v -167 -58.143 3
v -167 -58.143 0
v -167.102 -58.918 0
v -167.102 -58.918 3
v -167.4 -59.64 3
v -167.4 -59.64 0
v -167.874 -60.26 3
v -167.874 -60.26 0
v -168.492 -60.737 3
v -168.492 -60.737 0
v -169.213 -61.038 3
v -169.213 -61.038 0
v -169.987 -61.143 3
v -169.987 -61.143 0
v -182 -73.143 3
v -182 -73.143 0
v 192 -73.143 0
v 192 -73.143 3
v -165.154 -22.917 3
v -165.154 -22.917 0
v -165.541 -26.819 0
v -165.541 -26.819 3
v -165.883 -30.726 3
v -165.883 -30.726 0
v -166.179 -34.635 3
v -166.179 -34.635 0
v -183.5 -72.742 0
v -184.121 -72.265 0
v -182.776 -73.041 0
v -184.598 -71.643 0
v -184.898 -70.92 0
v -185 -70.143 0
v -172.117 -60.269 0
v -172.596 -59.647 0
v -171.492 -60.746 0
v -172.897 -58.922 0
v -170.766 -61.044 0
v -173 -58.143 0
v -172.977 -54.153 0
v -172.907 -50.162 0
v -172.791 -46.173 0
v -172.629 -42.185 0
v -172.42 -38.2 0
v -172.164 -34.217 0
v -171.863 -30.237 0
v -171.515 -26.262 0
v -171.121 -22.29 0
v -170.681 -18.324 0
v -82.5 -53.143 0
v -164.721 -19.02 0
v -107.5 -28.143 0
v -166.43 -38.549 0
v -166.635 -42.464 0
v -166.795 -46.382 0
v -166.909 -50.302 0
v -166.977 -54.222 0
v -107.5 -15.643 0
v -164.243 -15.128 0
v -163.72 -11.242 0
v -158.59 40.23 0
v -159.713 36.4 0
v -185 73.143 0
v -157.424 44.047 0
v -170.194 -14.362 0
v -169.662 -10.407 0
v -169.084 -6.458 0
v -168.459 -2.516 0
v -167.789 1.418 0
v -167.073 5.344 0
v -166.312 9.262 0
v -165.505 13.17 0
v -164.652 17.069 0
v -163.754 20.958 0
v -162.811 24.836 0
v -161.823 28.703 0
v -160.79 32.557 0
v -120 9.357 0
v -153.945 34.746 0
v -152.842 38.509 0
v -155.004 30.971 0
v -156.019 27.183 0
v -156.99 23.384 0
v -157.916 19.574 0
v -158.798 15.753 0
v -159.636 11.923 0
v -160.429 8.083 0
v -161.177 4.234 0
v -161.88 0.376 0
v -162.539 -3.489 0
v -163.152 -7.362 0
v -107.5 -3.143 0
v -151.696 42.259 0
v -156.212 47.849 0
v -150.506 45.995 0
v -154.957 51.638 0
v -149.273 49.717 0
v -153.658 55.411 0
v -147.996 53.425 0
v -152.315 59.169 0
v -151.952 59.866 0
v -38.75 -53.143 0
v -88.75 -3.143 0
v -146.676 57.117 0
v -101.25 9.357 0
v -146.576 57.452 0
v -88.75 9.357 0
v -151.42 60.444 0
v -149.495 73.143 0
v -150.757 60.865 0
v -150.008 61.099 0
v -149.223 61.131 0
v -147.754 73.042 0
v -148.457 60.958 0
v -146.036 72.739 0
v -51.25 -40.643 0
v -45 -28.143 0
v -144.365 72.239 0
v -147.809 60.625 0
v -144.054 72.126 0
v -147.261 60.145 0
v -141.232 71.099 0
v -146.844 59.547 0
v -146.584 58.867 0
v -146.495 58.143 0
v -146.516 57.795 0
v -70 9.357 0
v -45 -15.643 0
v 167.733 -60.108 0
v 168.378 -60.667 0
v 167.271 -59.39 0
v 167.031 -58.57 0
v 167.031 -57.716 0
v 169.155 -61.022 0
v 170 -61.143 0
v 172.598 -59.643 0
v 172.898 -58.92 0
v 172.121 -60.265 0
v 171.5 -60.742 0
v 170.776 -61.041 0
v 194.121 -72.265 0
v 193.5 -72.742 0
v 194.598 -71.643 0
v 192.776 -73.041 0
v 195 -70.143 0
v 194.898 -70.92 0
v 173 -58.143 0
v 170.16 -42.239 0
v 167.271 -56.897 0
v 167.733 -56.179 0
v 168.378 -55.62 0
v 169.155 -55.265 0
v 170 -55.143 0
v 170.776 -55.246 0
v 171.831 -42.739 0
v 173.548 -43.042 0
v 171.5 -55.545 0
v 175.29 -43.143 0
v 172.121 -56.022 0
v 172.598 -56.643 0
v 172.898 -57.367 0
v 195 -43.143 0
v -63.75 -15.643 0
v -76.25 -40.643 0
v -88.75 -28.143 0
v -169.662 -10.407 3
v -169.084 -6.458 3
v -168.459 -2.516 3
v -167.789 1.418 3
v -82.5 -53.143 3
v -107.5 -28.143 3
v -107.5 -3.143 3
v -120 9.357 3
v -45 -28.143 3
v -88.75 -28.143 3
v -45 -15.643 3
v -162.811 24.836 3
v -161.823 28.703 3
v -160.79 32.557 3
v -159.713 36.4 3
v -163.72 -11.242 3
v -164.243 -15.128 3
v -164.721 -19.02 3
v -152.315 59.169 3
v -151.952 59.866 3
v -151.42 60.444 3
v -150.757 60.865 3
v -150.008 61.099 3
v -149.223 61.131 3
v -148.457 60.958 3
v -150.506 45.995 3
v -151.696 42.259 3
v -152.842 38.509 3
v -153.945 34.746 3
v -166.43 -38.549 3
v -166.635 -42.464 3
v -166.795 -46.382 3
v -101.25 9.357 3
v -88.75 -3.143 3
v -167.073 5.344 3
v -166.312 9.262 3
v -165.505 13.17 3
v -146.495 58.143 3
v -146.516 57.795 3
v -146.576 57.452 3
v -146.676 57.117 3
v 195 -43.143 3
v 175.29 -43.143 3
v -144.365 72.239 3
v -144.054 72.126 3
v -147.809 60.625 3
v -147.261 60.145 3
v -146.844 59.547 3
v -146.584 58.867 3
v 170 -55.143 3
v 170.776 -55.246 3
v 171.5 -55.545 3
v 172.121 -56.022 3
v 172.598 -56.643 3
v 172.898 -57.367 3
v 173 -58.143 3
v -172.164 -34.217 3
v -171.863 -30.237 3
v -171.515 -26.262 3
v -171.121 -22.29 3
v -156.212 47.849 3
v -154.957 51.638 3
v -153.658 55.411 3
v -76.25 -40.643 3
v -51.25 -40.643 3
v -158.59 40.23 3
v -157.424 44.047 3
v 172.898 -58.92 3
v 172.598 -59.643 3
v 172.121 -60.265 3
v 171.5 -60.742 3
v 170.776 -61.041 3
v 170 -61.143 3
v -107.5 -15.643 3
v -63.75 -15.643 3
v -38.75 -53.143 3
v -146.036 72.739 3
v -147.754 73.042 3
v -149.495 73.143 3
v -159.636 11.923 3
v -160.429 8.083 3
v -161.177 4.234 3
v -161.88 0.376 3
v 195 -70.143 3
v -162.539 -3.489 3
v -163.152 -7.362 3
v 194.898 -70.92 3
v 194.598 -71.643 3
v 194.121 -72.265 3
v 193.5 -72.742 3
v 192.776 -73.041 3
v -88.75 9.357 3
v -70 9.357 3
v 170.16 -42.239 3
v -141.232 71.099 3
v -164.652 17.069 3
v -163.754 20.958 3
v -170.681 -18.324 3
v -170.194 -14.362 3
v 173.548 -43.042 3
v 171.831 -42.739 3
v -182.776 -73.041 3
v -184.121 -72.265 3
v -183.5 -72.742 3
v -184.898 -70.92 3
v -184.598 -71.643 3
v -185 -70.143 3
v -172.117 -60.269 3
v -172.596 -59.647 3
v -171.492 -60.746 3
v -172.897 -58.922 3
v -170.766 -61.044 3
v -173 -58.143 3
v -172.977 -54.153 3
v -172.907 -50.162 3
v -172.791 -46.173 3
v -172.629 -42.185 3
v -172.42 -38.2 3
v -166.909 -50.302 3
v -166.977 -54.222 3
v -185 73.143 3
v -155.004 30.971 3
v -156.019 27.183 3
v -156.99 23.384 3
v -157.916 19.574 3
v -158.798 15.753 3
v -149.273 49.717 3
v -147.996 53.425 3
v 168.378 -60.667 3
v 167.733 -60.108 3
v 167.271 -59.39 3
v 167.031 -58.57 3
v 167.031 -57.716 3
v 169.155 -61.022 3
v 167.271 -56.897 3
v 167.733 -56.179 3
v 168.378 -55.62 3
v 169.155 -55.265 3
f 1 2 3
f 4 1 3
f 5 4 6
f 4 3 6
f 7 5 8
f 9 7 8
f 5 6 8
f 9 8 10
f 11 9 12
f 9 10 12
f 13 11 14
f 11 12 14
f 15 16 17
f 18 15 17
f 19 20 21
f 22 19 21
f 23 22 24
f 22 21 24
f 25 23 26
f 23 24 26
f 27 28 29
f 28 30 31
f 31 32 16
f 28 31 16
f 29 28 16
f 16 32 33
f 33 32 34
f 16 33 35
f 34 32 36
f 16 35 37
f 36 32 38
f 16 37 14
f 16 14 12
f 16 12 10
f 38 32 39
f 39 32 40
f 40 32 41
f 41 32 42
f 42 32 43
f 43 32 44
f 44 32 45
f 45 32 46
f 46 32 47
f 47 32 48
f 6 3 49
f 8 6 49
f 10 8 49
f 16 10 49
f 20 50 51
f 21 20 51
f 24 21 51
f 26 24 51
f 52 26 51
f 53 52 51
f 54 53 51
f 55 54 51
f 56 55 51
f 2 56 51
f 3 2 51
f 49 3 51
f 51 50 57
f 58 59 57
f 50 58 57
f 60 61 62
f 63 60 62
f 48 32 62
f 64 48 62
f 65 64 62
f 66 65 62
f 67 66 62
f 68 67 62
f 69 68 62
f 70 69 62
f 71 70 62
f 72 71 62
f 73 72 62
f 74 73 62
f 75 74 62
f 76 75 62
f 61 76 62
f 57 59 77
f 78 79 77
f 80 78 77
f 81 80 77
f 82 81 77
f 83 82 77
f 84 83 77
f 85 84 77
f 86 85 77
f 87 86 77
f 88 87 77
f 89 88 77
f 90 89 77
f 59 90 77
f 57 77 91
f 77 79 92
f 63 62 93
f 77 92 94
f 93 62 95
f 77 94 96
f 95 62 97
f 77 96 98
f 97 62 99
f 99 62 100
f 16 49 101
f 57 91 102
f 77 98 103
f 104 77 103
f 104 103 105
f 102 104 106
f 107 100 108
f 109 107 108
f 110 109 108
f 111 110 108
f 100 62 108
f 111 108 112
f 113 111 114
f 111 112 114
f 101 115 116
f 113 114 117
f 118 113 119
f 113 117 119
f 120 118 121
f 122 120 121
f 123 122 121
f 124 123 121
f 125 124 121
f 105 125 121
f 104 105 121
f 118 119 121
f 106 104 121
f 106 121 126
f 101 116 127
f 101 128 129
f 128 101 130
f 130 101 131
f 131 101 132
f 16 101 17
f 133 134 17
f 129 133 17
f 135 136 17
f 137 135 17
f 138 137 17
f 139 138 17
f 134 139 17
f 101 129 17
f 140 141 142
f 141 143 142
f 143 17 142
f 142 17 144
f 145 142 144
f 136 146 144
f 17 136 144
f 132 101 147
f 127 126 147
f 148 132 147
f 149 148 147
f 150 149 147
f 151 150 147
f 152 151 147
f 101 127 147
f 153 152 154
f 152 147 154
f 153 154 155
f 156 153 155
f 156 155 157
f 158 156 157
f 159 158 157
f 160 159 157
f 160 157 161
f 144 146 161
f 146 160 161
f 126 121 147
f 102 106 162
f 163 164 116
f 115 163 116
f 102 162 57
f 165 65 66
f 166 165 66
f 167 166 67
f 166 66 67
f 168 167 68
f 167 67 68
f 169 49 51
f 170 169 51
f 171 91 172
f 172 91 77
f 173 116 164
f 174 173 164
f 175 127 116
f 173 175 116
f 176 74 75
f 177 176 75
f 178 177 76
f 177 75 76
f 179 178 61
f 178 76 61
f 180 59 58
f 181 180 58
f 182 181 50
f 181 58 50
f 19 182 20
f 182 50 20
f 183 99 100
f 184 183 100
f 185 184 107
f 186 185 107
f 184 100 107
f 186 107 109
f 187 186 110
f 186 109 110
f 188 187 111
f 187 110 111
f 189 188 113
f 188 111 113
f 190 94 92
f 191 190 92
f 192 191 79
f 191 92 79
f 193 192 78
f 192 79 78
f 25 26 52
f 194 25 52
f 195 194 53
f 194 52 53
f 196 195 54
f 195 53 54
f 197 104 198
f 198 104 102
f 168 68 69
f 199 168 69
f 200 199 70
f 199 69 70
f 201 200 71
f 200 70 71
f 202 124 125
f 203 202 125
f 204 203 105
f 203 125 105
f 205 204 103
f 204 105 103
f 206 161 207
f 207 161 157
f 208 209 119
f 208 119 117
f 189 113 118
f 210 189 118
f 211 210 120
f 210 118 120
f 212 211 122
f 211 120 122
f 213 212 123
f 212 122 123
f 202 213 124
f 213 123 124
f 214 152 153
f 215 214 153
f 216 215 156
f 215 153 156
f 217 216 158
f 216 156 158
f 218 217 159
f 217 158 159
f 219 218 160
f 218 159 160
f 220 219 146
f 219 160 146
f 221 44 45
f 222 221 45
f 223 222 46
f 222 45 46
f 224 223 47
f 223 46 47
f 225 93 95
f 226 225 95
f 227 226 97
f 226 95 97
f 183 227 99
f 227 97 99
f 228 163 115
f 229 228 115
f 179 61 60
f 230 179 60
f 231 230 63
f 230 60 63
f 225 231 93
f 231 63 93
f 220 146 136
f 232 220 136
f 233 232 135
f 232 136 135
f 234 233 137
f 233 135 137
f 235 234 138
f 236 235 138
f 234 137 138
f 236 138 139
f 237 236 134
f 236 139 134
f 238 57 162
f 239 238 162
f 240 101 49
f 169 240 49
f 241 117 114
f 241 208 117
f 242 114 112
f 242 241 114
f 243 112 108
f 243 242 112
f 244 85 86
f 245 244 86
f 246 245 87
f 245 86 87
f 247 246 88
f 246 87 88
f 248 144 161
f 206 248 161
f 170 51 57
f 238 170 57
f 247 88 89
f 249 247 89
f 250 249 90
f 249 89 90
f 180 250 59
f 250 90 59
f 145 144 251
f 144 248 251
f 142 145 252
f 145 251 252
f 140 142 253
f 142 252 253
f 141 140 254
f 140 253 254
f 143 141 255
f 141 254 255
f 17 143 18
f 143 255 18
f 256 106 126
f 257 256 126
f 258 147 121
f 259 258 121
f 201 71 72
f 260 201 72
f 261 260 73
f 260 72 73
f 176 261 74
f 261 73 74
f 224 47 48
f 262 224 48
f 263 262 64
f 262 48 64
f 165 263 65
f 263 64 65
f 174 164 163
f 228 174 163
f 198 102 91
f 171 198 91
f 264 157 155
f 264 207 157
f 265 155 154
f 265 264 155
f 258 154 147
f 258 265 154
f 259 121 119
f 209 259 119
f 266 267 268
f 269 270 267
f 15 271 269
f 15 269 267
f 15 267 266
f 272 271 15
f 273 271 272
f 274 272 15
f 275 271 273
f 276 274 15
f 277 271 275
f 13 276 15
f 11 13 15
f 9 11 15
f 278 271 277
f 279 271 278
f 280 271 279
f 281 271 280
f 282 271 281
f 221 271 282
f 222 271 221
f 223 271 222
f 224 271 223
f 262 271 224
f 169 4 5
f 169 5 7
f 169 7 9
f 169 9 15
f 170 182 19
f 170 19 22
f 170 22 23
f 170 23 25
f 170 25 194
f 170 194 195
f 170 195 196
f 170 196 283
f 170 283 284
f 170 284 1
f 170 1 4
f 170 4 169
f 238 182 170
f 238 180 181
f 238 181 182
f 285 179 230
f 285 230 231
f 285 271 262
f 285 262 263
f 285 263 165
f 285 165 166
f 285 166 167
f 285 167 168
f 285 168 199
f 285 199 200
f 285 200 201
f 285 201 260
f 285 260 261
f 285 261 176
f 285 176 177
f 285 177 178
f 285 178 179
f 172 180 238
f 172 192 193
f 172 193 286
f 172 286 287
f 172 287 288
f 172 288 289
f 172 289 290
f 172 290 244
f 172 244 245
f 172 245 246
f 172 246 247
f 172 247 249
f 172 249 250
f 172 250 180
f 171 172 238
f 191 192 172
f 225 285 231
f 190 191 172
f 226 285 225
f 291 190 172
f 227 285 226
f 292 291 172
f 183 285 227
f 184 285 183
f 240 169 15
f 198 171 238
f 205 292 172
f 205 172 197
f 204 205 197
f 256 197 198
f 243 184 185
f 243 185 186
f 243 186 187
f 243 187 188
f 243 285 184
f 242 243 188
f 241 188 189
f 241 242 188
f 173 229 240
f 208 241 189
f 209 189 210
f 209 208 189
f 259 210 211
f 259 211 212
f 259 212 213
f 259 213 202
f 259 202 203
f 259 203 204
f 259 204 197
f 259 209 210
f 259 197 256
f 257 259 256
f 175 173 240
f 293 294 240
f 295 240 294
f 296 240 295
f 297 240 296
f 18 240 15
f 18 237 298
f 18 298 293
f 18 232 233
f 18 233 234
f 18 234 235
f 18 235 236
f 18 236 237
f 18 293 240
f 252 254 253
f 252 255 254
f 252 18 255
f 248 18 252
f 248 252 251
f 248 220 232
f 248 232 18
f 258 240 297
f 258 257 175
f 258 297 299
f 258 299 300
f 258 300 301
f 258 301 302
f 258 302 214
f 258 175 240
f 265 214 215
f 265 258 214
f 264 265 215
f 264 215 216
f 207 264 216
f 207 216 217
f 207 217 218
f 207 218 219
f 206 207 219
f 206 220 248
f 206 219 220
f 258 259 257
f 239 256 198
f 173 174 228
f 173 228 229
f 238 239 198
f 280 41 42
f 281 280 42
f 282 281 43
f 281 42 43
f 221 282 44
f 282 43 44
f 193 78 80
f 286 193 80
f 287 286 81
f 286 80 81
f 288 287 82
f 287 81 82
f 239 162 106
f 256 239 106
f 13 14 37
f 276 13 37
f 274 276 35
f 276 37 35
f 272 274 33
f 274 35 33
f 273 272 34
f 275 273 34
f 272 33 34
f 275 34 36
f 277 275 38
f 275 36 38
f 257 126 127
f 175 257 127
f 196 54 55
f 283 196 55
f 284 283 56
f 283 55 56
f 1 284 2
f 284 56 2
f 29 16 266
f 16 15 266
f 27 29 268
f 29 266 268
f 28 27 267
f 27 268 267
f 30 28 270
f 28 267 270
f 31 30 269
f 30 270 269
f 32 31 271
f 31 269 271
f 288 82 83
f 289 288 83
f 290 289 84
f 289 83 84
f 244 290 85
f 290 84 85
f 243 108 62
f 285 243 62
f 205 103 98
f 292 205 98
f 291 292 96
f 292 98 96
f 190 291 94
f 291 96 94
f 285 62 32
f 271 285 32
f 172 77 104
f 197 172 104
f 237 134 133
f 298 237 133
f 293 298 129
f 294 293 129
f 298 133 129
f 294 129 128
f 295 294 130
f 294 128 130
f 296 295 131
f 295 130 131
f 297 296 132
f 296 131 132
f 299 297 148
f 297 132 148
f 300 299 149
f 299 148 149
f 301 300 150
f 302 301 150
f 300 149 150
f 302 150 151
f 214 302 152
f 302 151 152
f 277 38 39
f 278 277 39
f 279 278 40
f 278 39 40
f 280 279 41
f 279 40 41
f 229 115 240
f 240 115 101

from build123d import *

# Parameters (mm, degrees)
BOSS_EXTRUDE1_DEPTH = 3
FILLET1_R           = 15
FILLET2_R           = 3
CUT_EXTRUDE2_REACH  = 210.288


with BuildPart() as part:
    # Sketch1 → Boss-Extrude1 (new body)
    with BuildSketch(Plane.XY):
        with BuildLine():
            Line((172.644904711, -43.143424365), (-141.232259922, 71.098520777))
            ThreePointArc((-141.232259922, 71.098520777), (-144.032153784, 64.138243883), (-146.676413136, 57.117364125))
            ThreePointArc((-146.676413136, 57.117364125), (-148.639759836, 51.573044096), (-150.506045786, 45.99530337))
            ThreePointArc((-150.506045786, 45.99530337), (-152.274702625, 40.385840566), (-153.945191461, 34.746364791))
            ThreePointArc((-153.945191461, 34.746364791), (-155.517003393, 29.078594081), (-156.989659693, 23.384254699))
            ThreePointArc((-156.989659693, 23.384254699), (-158.362711759, 17.665081266), (-159.635741365, 11.922815828))
            ThreePointArc((-159.635741365, 11.922815828), (-160.808360796, 6.159207212), (-161.880212786, 0.37601139))
            ThreePointArc((-161.880212786, 0.37601139), (-162.850970773, -5.425009602), (-163.720339137, -11.242089133))
            ThreePointArc((-163.720339137, -11.242089133), (-164.48805308, -17.073455447), (-165.153878721, -22.917332071))
            ThreePointArc((-165.153878721, -22.917332071), (-165.717613271, -28.771939222), (-166.179084972, -34.635493212))
            ThreePointArc((-166.179084972, -34.635493212), (-166.538153226, -40.50620738), (-166.794708707, -46.382294014))
            ThreePointArc((-166.794708707, -46.382294014), (-166.948673268, -52.261963415), (-167, -58.143424365))
            ThreePointArc((-167, -58.143424365), (-166.916491303, -65.645283328), (-166.6660066, -73.143424365))
            Line((-166.6660066, -73.143424365), (170, -73.143424365))
            ThreePointArc((170, -73.143424365), (155, -58.143424365), (170, -43.143424365))
            Line((170, -43.143424365), (172.644904711, -43.143424365))
        make_face()
        with BuildLine():
            ThreePointArc((170, -43.143424365), (155, -58.143424365), (170, -73.143424365))
            Line((170, -73.143424365), (170, -61.143424365))
            ThreePointArc((170, -61.143424365), (167, -58.143424365), (170, -55.143424365))
            Line((170, -55.143424365), (170, -43.143424365))
        make_face()
        with BuildLine():
            Line((170, -61.143424365), (170, -73.143424365))
            ThreePointArc((170, -73.143424365), (180.606601718, -68.750026083), (185, -58.143424365))
            ThreePointArc((185, -58.143424365), (182.287280664, -49.53977782), (175.13030215, -44.048035054))
            ThreePointArc((175.13030215, -44.048035054), (172.604722665, -43.37130807), (170, -43.143424365))
            Line((170, -43.143424365), (170, -55.143424365))
            ThreePointArc((170, -55.143424365), (172.121320344, -56.022104022), (173, -58.143424365))
            ThreePointArc((173, -58.143424365), (172.121320344, -60.264744709), (170, -61.143424365))
        make_face()
        with BuildLine():
            ThreePointArc((185, -58.143424365), (180.606601718, -68.750026083), (170, -73.143424365))
            Line((170, -73.143424365), (185, -73.143424365))
            Line((185, -73.143424365), (185, -58.143424365))
        make_face()
        Polygon((195, -43.143424365), (185, -43.143424365), (185, -58.143424365), (185, -73.143424365), (195, -73.143424365), align=None)
        with BuildLine():
            Line((185, -43.143424365), (172.644904711, -43.143424365))
            Line((172.644904711, -43.143424365), (175.13030215, -44.048035054))
            ThreePointArc((175.13030215, -44.048035054), (182.287280664, -49.53977782), (185, -58.143424365))
            Line((185, -58.143424365), (185, -43.143424365))
        make_face()
        with BuildLine():
            Line((-141.232259922, 71.098520777), (-144.05410977, 72.125590127))
            ThreePointArc((-144.05410977, 72.125590127), (-146.304846887, 66.561201995), (-148.457003515, 60.957948056))
            ThreePointArc((-148.457003515, 60.957948056), (-147.034245178, 59.858728616), (-146.495491067, 58.143424365))
            ThreePointArc((-146.495491067, 58.143424365), (-146.541067791, 57.622479932), (-146.676413136, 57.117364125))
            ThreePointArc((-146.676413136, 57.117364125), (-144.032153784, 64.138243883), (-141.232259922, 71.098520777))
        make_face()
        with BuildLine():
            Line((-146.850586357, 73.143424365), (-146.879730103, 73.143424365))
            ThreePointArc((-146.879730103, 73.143424365), (-149.673514203, 66.186155049), (-152.314568802, 59.169485145))
            ThreePointArc((-152.314568802, 59.169485145), (-150.757344959, 60.865137935), (-148.457003515, 60.957948056))
            ThreePointArc((-148.457003515, 60.957948056), (-146.304846887, 66.561201995), (-144.05410977, 72.125590127))
            Line((-144.05410977, 72.125590127), (-146.850586357, 73.143424365))
        make_face()
        with BuildLine():
            Line((-146.879730103, 73.143424365), (-185, 73.143424365))
            Line((-185, 73.143424365), (-185, -73.143424365))
            Line((-185, -73.143424365), (-172.671854695, -73.143424365))
            ThreePointArc((-172.671854695, -73.143424365), (-172.917953861, -65.6452188), (-173, -58.143424352))
            ThreePointArc((-173, -58.143424352), (-172.947759441, -52.157249117), (-172.791053679, -46.172897328))
            ThreePointArc((-172.791053679, -46.172897328), (-172.529930414, -40.192191247), (-172.164469198, -34.216953285))
            ThreePointArc((-172.164469198, -34.216953285), (-171.694781411, -28.249004209), (-171.12101009, -22.290161263))
            ThreePointArc((-171.12101009, -22.290161263), (-170.443329971, -16.342239237), (-169.661947511, -10.407050258))
            ThreePointArc((-169.661947511, -10.407050258), (-168.777100779, -4.486402568), (-167.789059266, 1.417900674))
            ThreePointArc((-167.789059266, 1.417900674), (-166.698123892, 7.304061207), (-165.504627005, 13.170285803))
            ThreePointArc((-165.504627005, 13.170285803), (-164.208932183, 19.01478744), (-162.811434084, 24.835785939))
            ThreePointArc((-162.811434084, 24.835785939), (-161.312558439, 30.631508024), (-159.712761785, 36.400188407))
            ThreePointArc((-159.712761785, 36.400188407), (-158.01253136, 42.140070142), (-156.212385139, 47.849404552))
            ThreePointArc((-156.212385139, 47.849404552), (-154.312871396, 53.526452713), (-152.314568802, 59.169485145))
            ThreePointArc((-152.314568802, 59.169485145), (-149.673514203, 66.186155049), (-146.879730103, 73.143424365))
        make_face()
        with BuildLine():
            ThreePointArc((-173, -58.143424352), (-172.917953861, -65.6452188), (-172.671854695, -73.143424365))
            Line((-172.671854695, -73.143424365), (-169.668956486, -73.143424365))
            ThreePointArc((-169.668956486, -73.143424365), (-169.88082472, -67.144812467), (-169.986764706, -61.14339517))
            ThreePointArc((-169.986764706, -61.14339517), (-172.116635793, -60.269418938), (-173, -58.143424352))
        make_face()
        with BuildLine():
            ThreePointArc((-169.986764706, -61.14339517), (-169.88082472, -67.144812467), (-169.668956486, -73.143424365))
            Line((-169.668956486, -73.143424365), (-166.6660066, -73.143424365))
            ThreePointArc((-166.6660066, -73.143424365), (-166.916491303, -65.645283328), (-167, -58.143424365))
            ThreePointArc((-167, -58.143424365), (-167.874005423, -60.260060153), (-169.986764706, -61.14339517))
        make_face()
        with BuildLine():
            Line((175.13030215, -44.048035054), (172.644904711, -43.143424365))
            Line((172.644904711, -43.143424365), (170, -43.143424365))
            ThreePointArc((170, -43.143424365), (172.604722665, -43.37130807), (175.13030215, -44.048035054))
        make_face()
    extrude(amount=BOSS_EXTRUDE1_DEPTH)

    # Fillet1
    fillet1_edges = [part.edges().sort_by_distance(p)[0] for p in [
        (-146.850586357, 73.143424365, 1.5),
        (172.644904711, -43.143424365, 1.5),
    ]]
    fillet(fillet1_edges, radius=FILLET1_R)

    # Fillet2
    fillet2_edges = [part.edges().sort_by_distance(p)[0] for p in [
        (-185, -73.143424365, 1.5),
        (195, -73.143424365, 1.5),
    ]]
    fillet(fillet2_edges, radius=FILLET2_R)

    # Sketch5 → Cut-Extrude2 (cut, up to next)
    with BuildSketch(Plane(origin=(0, 0, 0), x_dir=(-1, 0, 0), z_dir=(0, 0, -1)), mode=Mode.PRIVATE) as cut_extrude2_sk1:
        Polygon((107.5, 9.356575635), (95, -3.143424365), (107.5, -3.143424365), (120, 9.356575635), align=None)
    cut_extrude2_tool1 = extrude(cut_extrude2_sk1.sketch, amount=-CUT_EXTRUDE2_REACH, mode=Mode.PRIVATE) & part.part
    # Sketch5 → Cut-Extrude2 (cut, up to next)
    with BuildSketch(Plane(origin=(0, 0, 0), x_dir=(-1, 0, 0), z_dir=(0, 0, -1)), mode=Mode.PRIVATE) as cut_extrude2_sk2:
        Polygon((101.25, 9.356575635), (88.75, -3.143424365), (95, -3.143424365), (107.5, 9.356575635), align=None)
    cut_extrude2_tool2 = extrude(cut_extrude2_sk2.sketch, amount=-CUT_EXTRUDE2_REACH, mode=Mode.PRIVATE) & part.part
    # Sketch5 → Cut-Extrude2 (cut, up to next)
    with BuildSketch(Plane(origin=(0, 0, 0), x_dir=(-1, 0, 0), z_dir=(0, 0, -1)), mode=Mode.PRIVATE) as cut_extrude2_sk3:
        Polygon((70, 9.356575635), (57.5, -3.143424365), (76.25, -3.143424365), (88.75, 9.356575635), align=None)
    cut_extrude2_tool3 = extrude(cut_extrude2_sk3.sketch, amount=-CUT_EXTRUDE2_REACH, mode=Mode.PRIVATE) & part.part
    # Sketch5 → Cut-Extrude2 (cut, up to next)
    with BuildSketch(Plane(origin=(0, 0, 0), x_dir=(-1, 0, 0), z_dir=(0, 0, -1)), mode=Mode.PRIVATE) as cut_extrude2_sk4:
        Polygon((57.5, -3.143424365), (45, -15.643424365), (63.75, -15.643424365), (76.25, -3.143424365), align=None)
    cut_extrude2_tool4 = extrude(cut_extrude2_sk4.sketch, amount=-CUT_EXTRUDE2_REACH, mode=Mode.PRIVATE) & part.part
    # Sketch5 → Cut-Extrude2 (cut, up to next)
    with BuildSketch(Plane(origin=(0, 0, 0), x_dir=(-1, 0, 0), z_dir=(0, 0, -1)), mode=Mode.PRIVATE) as cut_extrude2_sk5:
        Polygon((45, -28.143424365), (51.25, -28.143424365), (63.75, -15.643424365), (45, -15.643424365), align=None)
    cut_extrude2_tool5 = extrude(cut_extrude2_sk5.sketch, amount=-CUT_EXTRUDE2_REACH, mode=Mode.PRIVATE) & part.part
    # Sketch5 → Cut-Extrude2 (cut, up to next)
    with BuildSketch(Plane(origin=(0, 0, 0), x_dir=(-1, 0, 0), z_dir=(0, 0, -1)), mode=Mode.PRIVATE) as cut_extrude2_sk6:
        Polygon((63.75, -15.643424365), (51.25, -28.143424365), (70, -28.143424365), (82.5, -15.643424365), align=None)
    cut_extrude2_tool6 = extrude(cut_extrude2_sk6.sketch, amount=-CUT_EXTRUDE2_REACH, mode=Mode.PRIVATE) & part.part
    # Sketch5 → Cut-Extrude2 (cut, up to next)
    with BuildSketch(Plane(origin=(0, 0, 0), x_dir=(-1, 0, 0), z_dir=(0, 0, -1)), mode=Mode.PRIVATE) as cut_extrude2_sk7:
        Polygon((82.5, -15.643424365), (70, -28.143424365), (88.75, -28.143424365), (101.25, -15.643424365), align=None)
    cut_extrude2_tool7 = extrude(cut_extrude2_sk7.sketch, amount=-CUT_EXTRUDE2_REACH, mode=Mode.PRIVATE) & part.part
    # Sketch5 → Cut-Extrude2 (cut, up to next)
    with BuildSketch(Plane(origin=(0, 0, 0), x_dir=(-1, 0, 0), z_dir=(0, 0, -1)), mode=Mode.PRIVATE) as cut_extrude2_sk8:
        Polygon((101.25, -15.643424365), (88.75, -28.143424365), (107.5, -28.143424365), (107.5, -15.643424365), align=None)
    cut_extrude2_tool8 = extrude(cut_extrude2_sk8.sketch, amount=-CUT_EXTRUDE2_REACH, mode=Mode.PRIVATE) & part.part
    # Sketch5 → Cut-Extrude2 (cut, up to next)
    with BuildSketch(Plane(origin=(0, 0, 0), x_dir=(-1, 0, 0), z_dir=(0, 0, -1)), mode=Mode.PRIVATE) as cut_extrude2_sk9:
        Polygon((88.75, -28.143424365), (76.25, -40.643424365), (95, -40.643424365), (107.5, -28.143424365), align=None)
    cut_extrude2_tool9 = extrude(cut_extrude2_sk9.sketch, amount=-CUT_EXTRUDE2_REACH, mode=Mode.PRIVATE) & part.part
    # Sketch5 → Cut-Extrude2 (cut, up to next)
    with BuildSketch(Plane(origin=(0, 0, 0), x_dir=(-1, 0, 0), z_dir=(0, 0, -1)), mode=Mode.PRIVATE) as cut_extrude2_sk10:
        Polygon((76.25, -40.643424365), (63.75, -53.143424365), (82.5, -53.143424365), (95, -40.643424365), align=None)
    cut_extrude2_tool10 = extrude(cut_extrude2_sk10.sketch, amount=-CUT_EXTRUDE2_REACH, mode=Mode.PRIVATE) & part.part
    # Sketch5 → Cut-Extrude2 (cut, up to next)
    with BuildSketch(Plane(origin=(0, 0, 0), x_dir=(-1, 0, 0), z_dir=(0, 0, -1)), mode=Mode.PRIVATE) as cut_extrude2_sk11:
        Polygon((57.5, -40.643424365), (45, -53.143424365), (63.75, -53.143424365), (76.25, -40.643424365), align=None)
    cut_extrude2_tool11 = extrude(cut_extrude2_sk11.sketch, amount=-CUT_EXTRUDE2_REACH, mode=Mode.PRIVATE) & part.part
    # Sketch5 → Cut-Extrude2 (cut, up to next)
    with BuildSketch(Plane(origin=(0, 0, 0), x_dir=(-1, 0, 0), z_dir=(0, 0, -1)), mode=Mode.PRIVATE) as cut_extrude2_sk12:
        Polygon((51.25, -40.643424365), (38.75, -53.143424365), (45, -53.143424365), (57.5, -40.643424365), align=None)
    cut_extrude2_tool12 = extrude(cut_extrude2_sk12.sketch, amount=-CUT_EXTRUDE2_REACH, mode=Mode.PRIVATE) & part.part
    add(cut_extrude2_tool1.solids().sort_by_distance((-107.5, 3.106576, 0))[0], mode=Mode.SUBTRACT)
    add(cut_extrude2_tool2.solids().sort_by_distance((-98.125, 3.106576, 0))[0], mode=Mode.SUBTRACT)
    add(cut_extrude2_tool3.solids().sort_by_distance((-73.125, 3.106576, 0))[0], mode=Mode.SUBTRACT)
    add(cut_extrude2_tool4.solids().sort_by_distance((-60.625, -9.393424, 0))[0], mode=Mode.SUBTRACT)
    add(cut_extrude2_tool5.solids().sort_by_distance((-51.770833, -20.851758, 0))[0], mode=Mode.SUBTRACT)
    add(cut_extrude2_tool6.solids().sort_by_distance((-66.875, -21.893424, 0))[0], mode=Mode.SUBTRACT)
    add(cut_extrude2_tool7.solids().sort_by_distance((-85.625, -21.893424, 0))[0], mode=Mode.SUBTRACT)
    add(cut_extrude2_tool8.solids().sort_by_distance((-100.729167, -22.935091, 0))[0], mode=Mode.SUBTRACT)
    add(cut_extrude2_tool9.solids().sort_by_distance((-91.875, -34.393424, 0))[0], mode=Mode.SUBTRACT)
    add(cut_extrude2_tool10.solids().sort_by_distance((-79.375, -46.893424, 0))[0], mode=Mode.SUBTRACT)
    add(cut_extrude2_tool11.solids().sort_by_distance((-60.625, -46.893424, 0))[0], mode=Mode.SUBTRACT)
    add(cut_extrude2_tool12.solids().sort_by_distance((-48.125, -46.893424, 0))[0], mode=Mode.SUBTRACT)


solid = part.part
